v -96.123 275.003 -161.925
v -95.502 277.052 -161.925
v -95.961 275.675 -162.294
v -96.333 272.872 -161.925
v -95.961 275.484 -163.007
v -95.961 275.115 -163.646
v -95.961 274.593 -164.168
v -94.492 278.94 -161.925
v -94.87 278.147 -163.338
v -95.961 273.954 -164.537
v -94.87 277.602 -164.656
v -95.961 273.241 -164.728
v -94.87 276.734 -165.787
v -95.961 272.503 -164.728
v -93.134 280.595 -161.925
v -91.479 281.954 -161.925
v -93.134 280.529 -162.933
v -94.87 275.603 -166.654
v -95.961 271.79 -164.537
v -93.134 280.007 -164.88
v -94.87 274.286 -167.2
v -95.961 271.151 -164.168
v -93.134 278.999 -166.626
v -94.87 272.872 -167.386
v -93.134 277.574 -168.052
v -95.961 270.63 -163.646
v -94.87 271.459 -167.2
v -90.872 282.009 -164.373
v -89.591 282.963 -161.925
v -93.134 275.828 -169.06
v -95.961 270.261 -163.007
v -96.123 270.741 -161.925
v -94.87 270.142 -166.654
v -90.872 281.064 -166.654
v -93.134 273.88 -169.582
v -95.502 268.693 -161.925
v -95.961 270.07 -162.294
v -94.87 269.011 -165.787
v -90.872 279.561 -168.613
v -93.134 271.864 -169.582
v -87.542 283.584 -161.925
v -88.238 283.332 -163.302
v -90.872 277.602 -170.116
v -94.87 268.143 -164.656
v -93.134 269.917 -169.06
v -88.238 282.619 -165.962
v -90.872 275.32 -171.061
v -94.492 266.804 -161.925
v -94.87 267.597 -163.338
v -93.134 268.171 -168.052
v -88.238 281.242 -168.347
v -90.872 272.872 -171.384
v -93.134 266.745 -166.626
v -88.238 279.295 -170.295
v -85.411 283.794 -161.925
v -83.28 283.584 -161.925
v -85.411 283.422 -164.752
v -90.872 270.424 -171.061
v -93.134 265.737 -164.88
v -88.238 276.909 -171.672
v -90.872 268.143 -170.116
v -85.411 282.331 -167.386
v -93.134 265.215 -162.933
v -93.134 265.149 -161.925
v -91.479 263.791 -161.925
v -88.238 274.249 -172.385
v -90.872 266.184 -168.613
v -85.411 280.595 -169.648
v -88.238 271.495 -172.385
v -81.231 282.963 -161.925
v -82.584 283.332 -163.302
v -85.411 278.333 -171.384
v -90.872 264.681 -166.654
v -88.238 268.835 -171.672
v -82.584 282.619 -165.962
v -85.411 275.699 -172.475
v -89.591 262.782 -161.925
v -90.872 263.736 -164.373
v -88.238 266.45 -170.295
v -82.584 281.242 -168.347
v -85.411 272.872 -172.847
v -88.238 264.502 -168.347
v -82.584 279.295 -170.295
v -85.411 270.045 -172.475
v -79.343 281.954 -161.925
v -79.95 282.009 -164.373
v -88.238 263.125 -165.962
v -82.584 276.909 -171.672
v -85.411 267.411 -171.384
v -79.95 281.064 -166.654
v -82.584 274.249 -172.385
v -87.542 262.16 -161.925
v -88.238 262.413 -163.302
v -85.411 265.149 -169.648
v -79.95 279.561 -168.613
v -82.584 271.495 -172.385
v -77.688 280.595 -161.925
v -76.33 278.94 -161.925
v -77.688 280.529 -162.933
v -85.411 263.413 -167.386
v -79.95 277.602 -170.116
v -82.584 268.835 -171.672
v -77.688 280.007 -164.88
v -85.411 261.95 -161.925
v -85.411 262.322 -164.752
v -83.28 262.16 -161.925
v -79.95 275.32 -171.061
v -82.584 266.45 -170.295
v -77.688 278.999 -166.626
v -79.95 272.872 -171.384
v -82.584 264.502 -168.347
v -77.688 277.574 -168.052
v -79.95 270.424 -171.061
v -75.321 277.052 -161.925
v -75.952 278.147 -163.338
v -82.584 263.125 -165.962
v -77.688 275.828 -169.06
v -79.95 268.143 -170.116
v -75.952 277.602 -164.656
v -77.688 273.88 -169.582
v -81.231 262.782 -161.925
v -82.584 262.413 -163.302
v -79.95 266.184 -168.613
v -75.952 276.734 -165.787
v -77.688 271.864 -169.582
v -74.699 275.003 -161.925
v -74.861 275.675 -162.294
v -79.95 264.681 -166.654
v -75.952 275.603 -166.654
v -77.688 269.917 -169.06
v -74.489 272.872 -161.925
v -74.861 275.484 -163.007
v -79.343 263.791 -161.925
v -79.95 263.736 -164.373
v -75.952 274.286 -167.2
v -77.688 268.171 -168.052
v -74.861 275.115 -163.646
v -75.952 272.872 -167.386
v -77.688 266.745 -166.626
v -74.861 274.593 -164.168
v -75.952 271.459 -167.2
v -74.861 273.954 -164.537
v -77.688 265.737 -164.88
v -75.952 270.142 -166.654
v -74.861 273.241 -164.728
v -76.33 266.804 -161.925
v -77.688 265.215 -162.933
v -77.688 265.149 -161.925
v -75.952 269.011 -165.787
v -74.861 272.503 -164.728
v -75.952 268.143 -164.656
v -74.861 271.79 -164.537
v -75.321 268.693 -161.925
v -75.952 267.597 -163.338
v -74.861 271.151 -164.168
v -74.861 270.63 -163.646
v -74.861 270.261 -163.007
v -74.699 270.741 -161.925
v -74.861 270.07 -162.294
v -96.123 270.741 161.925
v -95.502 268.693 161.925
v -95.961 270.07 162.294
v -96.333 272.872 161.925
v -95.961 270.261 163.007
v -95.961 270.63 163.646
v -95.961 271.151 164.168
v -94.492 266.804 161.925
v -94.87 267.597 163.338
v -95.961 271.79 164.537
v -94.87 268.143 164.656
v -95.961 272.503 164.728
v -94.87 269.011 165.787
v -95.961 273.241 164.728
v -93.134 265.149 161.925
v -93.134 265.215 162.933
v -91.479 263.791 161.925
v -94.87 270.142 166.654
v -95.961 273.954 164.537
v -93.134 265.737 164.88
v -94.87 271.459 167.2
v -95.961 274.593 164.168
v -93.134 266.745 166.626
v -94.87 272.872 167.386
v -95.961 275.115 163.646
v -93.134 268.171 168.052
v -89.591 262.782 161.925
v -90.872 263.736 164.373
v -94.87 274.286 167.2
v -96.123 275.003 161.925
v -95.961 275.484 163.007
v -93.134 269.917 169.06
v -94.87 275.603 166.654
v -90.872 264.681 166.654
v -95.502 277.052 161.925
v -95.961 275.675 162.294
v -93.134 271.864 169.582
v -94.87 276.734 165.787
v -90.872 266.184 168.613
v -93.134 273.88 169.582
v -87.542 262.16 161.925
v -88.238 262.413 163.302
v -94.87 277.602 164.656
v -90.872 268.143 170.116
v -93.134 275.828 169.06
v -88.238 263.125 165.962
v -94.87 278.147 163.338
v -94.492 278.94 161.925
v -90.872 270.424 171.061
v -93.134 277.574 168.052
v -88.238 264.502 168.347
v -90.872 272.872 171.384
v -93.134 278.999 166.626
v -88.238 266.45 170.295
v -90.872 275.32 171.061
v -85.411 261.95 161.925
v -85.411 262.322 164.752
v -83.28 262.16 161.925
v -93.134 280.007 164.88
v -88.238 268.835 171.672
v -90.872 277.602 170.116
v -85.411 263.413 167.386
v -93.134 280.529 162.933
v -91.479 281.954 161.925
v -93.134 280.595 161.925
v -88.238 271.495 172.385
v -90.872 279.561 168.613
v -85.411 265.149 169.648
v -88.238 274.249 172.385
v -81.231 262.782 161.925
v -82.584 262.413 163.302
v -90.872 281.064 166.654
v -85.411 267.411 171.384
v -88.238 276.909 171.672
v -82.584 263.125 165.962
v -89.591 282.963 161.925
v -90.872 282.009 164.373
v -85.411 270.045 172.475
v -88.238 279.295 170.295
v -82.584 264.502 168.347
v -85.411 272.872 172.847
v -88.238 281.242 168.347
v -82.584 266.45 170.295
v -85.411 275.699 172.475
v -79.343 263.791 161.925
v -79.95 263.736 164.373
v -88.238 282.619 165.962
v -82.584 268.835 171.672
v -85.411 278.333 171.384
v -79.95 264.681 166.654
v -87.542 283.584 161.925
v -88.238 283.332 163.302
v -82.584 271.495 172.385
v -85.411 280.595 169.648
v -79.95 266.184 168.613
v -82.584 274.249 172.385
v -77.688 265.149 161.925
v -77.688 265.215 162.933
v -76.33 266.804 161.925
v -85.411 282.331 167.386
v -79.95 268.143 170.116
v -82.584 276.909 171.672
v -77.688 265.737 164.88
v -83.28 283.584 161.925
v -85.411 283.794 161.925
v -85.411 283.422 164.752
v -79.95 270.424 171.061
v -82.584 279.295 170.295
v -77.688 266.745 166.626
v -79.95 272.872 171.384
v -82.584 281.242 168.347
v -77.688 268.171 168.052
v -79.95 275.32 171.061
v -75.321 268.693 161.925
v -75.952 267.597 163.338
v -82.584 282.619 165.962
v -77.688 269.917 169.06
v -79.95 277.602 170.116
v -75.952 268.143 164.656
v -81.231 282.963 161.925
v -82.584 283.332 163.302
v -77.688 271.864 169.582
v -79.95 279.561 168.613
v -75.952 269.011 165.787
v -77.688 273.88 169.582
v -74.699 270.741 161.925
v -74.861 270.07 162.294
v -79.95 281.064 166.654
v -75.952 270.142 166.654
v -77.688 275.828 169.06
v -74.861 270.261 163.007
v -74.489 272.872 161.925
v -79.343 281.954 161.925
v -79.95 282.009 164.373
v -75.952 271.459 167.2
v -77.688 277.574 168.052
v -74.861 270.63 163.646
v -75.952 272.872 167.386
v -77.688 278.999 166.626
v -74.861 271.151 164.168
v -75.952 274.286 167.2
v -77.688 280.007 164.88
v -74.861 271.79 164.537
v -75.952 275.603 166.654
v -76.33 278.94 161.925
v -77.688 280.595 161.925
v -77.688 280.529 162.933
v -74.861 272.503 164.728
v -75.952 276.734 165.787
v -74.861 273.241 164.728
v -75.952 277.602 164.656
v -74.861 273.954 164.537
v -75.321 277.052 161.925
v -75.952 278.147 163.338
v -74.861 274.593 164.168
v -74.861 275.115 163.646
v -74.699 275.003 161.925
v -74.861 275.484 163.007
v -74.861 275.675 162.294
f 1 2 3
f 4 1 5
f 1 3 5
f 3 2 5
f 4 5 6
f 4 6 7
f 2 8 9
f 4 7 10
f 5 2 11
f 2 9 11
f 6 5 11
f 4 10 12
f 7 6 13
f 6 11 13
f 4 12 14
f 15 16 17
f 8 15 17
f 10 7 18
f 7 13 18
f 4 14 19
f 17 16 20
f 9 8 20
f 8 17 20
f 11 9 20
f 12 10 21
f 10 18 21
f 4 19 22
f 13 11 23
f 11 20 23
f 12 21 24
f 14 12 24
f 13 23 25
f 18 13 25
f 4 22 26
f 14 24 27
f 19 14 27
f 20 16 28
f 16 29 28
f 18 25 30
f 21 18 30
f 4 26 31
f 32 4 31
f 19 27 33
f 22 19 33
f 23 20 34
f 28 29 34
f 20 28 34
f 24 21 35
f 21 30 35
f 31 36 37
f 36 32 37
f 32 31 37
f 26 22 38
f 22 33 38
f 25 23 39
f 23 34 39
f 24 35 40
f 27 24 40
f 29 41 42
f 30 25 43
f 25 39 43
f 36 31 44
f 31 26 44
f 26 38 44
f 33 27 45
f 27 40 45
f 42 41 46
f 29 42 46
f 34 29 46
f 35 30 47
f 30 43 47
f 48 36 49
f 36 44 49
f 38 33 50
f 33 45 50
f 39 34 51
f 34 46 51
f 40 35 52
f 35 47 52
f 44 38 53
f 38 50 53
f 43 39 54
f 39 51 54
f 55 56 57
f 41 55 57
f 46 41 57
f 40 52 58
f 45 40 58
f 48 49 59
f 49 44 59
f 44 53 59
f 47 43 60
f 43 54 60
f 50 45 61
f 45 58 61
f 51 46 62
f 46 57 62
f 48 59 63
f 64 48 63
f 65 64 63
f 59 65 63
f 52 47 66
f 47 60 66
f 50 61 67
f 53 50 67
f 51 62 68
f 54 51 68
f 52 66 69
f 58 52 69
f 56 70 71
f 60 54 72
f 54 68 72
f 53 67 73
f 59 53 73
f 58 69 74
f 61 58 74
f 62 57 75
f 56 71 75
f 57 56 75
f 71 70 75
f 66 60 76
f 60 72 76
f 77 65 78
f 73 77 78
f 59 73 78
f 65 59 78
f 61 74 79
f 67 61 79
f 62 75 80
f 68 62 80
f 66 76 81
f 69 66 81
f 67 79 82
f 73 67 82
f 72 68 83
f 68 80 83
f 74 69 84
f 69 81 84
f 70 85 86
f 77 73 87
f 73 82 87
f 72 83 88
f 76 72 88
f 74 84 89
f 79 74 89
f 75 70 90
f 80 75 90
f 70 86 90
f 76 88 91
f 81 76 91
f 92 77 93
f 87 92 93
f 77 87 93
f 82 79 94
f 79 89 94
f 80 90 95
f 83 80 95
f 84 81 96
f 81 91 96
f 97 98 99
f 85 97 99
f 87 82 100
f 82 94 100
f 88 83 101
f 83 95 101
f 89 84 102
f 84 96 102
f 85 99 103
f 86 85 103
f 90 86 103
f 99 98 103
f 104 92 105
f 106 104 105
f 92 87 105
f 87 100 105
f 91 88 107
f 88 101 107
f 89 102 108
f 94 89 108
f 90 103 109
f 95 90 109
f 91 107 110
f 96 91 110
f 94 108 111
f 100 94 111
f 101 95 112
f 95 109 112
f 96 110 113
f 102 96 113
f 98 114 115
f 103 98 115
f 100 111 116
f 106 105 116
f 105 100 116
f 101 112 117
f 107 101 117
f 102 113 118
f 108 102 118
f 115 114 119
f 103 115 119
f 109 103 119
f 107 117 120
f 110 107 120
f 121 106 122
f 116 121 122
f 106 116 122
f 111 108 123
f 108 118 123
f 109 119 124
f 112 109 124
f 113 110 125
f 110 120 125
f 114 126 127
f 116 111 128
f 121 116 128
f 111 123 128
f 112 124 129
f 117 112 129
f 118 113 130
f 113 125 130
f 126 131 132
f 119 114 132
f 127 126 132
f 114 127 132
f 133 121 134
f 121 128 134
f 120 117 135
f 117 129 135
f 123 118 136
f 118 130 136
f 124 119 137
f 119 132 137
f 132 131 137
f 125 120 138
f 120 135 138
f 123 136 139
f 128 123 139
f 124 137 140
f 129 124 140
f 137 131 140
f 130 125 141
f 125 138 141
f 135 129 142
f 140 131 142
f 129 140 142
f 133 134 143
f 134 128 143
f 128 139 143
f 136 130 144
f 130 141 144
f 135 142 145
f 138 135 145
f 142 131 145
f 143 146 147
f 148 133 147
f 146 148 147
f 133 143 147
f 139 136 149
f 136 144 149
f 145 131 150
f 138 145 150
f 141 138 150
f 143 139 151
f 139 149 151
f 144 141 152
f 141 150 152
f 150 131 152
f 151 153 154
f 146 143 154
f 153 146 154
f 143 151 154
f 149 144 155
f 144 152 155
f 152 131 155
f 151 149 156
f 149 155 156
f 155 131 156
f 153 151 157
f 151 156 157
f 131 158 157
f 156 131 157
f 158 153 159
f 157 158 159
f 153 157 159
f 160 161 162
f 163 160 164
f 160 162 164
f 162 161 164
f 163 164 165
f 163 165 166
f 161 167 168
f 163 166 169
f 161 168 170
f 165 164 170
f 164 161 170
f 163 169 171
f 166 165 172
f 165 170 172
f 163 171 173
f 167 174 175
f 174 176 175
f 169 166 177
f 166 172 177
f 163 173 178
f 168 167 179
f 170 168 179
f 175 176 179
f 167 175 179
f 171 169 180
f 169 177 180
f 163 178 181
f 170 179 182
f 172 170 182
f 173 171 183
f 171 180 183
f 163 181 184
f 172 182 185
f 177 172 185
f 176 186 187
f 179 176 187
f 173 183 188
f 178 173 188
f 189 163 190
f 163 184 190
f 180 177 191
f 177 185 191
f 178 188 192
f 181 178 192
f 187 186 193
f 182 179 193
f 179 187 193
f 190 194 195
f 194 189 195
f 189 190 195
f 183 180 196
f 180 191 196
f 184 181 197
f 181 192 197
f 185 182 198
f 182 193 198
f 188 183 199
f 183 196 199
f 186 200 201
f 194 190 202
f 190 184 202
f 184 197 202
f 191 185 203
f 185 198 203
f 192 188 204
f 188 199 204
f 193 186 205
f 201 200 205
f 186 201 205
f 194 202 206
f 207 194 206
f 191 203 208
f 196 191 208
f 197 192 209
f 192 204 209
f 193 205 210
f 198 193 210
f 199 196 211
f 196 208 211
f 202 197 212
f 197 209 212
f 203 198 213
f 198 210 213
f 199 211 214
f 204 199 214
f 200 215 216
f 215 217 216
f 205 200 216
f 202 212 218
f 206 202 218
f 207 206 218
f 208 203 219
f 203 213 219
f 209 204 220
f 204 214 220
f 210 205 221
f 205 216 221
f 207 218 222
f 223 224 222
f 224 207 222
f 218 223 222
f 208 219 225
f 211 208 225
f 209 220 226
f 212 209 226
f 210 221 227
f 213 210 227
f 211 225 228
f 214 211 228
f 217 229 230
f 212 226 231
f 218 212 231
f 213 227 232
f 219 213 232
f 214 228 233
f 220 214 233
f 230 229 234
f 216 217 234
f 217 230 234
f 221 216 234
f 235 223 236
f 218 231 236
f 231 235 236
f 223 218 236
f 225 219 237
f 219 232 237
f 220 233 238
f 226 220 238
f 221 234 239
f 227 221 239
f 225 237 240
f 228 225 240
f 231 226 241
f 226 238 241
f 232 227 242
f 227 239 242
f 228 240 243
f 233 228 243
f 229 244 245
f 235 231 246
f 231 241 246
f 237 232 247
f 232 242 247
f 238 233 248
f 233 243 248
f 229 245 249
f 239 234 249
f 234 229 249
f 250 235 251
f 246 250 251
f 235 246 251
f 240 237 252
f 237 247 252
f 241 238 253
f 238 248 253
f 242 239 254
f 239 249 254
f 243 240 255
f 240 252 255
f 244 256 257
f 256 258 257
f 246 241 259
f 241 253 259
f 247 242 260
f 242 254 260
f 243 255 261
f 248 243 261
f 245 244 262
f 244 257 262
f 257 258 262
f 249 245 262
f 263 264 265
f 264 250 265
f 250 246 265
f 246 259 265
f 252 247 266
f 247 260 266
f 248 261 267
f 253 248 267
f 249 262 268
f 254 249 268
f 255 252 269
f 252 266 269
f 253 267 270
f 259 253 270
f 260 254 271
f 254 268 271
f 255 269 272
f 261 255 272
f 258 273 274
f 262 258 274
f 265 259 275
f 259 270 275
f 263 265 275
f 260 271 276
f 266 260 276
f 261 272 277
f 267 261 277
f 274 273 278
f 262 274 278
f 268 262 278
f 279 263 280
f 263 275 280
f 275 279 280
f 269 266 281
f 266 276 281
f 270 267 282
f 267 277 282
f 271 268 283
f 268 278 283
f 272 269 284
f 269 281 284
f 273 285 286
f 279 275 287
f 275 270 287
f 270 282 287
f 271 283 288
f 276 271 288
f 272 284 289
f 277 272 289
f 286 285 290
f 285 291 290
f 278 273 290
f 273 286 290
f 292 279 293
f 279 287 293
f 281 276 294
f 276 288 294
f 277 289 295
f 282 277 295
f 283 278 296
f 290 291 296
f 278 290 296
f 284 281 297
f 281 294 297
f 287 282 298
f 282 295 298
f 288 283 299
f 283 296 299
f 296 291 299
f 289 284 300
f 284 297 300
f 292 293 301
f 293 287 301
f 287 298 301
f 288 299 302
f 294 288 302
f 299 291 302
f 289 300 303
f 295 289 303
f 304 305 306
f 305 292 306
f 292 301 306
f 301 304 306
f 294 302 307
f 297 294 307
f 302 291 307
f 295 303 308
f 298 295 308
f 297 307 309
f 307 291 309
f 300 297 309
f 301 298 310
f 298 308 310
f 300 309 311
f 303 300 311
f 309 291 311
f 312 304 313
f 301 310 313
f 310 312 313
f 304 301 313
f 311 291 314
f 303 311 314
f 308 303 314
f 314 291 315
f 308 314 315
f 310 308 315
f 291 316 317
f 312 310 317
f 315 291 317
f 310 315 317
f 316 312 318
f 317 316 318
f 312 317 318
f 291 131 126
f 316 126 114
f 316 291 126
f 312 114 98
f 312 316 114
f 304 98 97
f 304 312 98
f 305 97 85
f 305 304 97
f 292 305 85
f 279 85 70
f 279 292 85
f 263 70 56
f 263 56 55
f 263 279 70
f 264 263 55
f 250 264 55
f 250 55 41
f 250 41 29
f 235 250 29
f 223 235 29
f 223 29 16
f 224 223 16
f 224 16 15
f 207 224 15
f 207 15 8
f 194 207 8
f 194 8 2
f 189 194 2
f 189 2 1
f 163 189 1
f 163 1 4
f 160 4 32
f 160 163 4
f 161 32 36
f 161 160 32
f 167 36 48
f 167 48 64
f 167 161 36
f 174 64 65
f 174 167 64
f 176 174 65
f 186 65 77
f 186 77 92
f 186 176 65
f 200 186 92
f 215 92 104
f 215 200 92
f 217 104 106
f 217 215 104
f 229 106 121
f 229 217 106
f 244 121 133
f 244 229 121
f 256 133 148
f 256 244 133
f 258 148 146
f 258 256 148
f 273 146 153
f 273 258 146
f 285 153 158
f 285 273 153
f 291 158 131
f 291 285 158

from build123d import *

# Parameters (mm, degrees)
SKETCH1_R           = 10.922
BOSS_EXTRUDE1_DEPTH = 161.925


with BuildPart() as part:
    # Sketch1 → Boss-Extrude1 (new body, symmetric)
    with BuildSketch(Plane.XY):
        with Locations((-85.411167397, 272.8722)):
            Circle(SKETCH1_R)
    extrude(amount=BOSS_EXTRUDE1_DEPTH, both=True)

    # Sketch3 → Revolve2 (revolve)
    with BuildSketch(Plane(origin=(0, 0, -161.925), x_dir=(-1, 0, 0), z_dir=(0, 0, -1))):
        with BuildLine():
            Line((74.489167397, 272.8722), (96.333167397, 272.8722))
            ThreePointArc((96.333167397, 272.8722), (85.411167397, 283.7942), (74.489167397, 272.8722))
        make_face()
    revolve(axis=Axis((-74.489167397, 272.8722, -161.925), (-1, 0, 0)))

    # Sketch4 → Revolve3 (revolve)
    with BuildSketch(Plane.XY.offset(161.925)):
        with BuildLine():
            Line((-74.489167397, 272.8722), (-96.333167397, 272.8722))
            ThreePointArc((-96.333167397, 272.8722), (-85.411167397, 283.7942), (-74.489167397, 272.8722))
        make_face()
    revolve(axis=Axis((-74.489167397, 272.8722, 161.925), (-1, 0, 0)))


solid = part.part
